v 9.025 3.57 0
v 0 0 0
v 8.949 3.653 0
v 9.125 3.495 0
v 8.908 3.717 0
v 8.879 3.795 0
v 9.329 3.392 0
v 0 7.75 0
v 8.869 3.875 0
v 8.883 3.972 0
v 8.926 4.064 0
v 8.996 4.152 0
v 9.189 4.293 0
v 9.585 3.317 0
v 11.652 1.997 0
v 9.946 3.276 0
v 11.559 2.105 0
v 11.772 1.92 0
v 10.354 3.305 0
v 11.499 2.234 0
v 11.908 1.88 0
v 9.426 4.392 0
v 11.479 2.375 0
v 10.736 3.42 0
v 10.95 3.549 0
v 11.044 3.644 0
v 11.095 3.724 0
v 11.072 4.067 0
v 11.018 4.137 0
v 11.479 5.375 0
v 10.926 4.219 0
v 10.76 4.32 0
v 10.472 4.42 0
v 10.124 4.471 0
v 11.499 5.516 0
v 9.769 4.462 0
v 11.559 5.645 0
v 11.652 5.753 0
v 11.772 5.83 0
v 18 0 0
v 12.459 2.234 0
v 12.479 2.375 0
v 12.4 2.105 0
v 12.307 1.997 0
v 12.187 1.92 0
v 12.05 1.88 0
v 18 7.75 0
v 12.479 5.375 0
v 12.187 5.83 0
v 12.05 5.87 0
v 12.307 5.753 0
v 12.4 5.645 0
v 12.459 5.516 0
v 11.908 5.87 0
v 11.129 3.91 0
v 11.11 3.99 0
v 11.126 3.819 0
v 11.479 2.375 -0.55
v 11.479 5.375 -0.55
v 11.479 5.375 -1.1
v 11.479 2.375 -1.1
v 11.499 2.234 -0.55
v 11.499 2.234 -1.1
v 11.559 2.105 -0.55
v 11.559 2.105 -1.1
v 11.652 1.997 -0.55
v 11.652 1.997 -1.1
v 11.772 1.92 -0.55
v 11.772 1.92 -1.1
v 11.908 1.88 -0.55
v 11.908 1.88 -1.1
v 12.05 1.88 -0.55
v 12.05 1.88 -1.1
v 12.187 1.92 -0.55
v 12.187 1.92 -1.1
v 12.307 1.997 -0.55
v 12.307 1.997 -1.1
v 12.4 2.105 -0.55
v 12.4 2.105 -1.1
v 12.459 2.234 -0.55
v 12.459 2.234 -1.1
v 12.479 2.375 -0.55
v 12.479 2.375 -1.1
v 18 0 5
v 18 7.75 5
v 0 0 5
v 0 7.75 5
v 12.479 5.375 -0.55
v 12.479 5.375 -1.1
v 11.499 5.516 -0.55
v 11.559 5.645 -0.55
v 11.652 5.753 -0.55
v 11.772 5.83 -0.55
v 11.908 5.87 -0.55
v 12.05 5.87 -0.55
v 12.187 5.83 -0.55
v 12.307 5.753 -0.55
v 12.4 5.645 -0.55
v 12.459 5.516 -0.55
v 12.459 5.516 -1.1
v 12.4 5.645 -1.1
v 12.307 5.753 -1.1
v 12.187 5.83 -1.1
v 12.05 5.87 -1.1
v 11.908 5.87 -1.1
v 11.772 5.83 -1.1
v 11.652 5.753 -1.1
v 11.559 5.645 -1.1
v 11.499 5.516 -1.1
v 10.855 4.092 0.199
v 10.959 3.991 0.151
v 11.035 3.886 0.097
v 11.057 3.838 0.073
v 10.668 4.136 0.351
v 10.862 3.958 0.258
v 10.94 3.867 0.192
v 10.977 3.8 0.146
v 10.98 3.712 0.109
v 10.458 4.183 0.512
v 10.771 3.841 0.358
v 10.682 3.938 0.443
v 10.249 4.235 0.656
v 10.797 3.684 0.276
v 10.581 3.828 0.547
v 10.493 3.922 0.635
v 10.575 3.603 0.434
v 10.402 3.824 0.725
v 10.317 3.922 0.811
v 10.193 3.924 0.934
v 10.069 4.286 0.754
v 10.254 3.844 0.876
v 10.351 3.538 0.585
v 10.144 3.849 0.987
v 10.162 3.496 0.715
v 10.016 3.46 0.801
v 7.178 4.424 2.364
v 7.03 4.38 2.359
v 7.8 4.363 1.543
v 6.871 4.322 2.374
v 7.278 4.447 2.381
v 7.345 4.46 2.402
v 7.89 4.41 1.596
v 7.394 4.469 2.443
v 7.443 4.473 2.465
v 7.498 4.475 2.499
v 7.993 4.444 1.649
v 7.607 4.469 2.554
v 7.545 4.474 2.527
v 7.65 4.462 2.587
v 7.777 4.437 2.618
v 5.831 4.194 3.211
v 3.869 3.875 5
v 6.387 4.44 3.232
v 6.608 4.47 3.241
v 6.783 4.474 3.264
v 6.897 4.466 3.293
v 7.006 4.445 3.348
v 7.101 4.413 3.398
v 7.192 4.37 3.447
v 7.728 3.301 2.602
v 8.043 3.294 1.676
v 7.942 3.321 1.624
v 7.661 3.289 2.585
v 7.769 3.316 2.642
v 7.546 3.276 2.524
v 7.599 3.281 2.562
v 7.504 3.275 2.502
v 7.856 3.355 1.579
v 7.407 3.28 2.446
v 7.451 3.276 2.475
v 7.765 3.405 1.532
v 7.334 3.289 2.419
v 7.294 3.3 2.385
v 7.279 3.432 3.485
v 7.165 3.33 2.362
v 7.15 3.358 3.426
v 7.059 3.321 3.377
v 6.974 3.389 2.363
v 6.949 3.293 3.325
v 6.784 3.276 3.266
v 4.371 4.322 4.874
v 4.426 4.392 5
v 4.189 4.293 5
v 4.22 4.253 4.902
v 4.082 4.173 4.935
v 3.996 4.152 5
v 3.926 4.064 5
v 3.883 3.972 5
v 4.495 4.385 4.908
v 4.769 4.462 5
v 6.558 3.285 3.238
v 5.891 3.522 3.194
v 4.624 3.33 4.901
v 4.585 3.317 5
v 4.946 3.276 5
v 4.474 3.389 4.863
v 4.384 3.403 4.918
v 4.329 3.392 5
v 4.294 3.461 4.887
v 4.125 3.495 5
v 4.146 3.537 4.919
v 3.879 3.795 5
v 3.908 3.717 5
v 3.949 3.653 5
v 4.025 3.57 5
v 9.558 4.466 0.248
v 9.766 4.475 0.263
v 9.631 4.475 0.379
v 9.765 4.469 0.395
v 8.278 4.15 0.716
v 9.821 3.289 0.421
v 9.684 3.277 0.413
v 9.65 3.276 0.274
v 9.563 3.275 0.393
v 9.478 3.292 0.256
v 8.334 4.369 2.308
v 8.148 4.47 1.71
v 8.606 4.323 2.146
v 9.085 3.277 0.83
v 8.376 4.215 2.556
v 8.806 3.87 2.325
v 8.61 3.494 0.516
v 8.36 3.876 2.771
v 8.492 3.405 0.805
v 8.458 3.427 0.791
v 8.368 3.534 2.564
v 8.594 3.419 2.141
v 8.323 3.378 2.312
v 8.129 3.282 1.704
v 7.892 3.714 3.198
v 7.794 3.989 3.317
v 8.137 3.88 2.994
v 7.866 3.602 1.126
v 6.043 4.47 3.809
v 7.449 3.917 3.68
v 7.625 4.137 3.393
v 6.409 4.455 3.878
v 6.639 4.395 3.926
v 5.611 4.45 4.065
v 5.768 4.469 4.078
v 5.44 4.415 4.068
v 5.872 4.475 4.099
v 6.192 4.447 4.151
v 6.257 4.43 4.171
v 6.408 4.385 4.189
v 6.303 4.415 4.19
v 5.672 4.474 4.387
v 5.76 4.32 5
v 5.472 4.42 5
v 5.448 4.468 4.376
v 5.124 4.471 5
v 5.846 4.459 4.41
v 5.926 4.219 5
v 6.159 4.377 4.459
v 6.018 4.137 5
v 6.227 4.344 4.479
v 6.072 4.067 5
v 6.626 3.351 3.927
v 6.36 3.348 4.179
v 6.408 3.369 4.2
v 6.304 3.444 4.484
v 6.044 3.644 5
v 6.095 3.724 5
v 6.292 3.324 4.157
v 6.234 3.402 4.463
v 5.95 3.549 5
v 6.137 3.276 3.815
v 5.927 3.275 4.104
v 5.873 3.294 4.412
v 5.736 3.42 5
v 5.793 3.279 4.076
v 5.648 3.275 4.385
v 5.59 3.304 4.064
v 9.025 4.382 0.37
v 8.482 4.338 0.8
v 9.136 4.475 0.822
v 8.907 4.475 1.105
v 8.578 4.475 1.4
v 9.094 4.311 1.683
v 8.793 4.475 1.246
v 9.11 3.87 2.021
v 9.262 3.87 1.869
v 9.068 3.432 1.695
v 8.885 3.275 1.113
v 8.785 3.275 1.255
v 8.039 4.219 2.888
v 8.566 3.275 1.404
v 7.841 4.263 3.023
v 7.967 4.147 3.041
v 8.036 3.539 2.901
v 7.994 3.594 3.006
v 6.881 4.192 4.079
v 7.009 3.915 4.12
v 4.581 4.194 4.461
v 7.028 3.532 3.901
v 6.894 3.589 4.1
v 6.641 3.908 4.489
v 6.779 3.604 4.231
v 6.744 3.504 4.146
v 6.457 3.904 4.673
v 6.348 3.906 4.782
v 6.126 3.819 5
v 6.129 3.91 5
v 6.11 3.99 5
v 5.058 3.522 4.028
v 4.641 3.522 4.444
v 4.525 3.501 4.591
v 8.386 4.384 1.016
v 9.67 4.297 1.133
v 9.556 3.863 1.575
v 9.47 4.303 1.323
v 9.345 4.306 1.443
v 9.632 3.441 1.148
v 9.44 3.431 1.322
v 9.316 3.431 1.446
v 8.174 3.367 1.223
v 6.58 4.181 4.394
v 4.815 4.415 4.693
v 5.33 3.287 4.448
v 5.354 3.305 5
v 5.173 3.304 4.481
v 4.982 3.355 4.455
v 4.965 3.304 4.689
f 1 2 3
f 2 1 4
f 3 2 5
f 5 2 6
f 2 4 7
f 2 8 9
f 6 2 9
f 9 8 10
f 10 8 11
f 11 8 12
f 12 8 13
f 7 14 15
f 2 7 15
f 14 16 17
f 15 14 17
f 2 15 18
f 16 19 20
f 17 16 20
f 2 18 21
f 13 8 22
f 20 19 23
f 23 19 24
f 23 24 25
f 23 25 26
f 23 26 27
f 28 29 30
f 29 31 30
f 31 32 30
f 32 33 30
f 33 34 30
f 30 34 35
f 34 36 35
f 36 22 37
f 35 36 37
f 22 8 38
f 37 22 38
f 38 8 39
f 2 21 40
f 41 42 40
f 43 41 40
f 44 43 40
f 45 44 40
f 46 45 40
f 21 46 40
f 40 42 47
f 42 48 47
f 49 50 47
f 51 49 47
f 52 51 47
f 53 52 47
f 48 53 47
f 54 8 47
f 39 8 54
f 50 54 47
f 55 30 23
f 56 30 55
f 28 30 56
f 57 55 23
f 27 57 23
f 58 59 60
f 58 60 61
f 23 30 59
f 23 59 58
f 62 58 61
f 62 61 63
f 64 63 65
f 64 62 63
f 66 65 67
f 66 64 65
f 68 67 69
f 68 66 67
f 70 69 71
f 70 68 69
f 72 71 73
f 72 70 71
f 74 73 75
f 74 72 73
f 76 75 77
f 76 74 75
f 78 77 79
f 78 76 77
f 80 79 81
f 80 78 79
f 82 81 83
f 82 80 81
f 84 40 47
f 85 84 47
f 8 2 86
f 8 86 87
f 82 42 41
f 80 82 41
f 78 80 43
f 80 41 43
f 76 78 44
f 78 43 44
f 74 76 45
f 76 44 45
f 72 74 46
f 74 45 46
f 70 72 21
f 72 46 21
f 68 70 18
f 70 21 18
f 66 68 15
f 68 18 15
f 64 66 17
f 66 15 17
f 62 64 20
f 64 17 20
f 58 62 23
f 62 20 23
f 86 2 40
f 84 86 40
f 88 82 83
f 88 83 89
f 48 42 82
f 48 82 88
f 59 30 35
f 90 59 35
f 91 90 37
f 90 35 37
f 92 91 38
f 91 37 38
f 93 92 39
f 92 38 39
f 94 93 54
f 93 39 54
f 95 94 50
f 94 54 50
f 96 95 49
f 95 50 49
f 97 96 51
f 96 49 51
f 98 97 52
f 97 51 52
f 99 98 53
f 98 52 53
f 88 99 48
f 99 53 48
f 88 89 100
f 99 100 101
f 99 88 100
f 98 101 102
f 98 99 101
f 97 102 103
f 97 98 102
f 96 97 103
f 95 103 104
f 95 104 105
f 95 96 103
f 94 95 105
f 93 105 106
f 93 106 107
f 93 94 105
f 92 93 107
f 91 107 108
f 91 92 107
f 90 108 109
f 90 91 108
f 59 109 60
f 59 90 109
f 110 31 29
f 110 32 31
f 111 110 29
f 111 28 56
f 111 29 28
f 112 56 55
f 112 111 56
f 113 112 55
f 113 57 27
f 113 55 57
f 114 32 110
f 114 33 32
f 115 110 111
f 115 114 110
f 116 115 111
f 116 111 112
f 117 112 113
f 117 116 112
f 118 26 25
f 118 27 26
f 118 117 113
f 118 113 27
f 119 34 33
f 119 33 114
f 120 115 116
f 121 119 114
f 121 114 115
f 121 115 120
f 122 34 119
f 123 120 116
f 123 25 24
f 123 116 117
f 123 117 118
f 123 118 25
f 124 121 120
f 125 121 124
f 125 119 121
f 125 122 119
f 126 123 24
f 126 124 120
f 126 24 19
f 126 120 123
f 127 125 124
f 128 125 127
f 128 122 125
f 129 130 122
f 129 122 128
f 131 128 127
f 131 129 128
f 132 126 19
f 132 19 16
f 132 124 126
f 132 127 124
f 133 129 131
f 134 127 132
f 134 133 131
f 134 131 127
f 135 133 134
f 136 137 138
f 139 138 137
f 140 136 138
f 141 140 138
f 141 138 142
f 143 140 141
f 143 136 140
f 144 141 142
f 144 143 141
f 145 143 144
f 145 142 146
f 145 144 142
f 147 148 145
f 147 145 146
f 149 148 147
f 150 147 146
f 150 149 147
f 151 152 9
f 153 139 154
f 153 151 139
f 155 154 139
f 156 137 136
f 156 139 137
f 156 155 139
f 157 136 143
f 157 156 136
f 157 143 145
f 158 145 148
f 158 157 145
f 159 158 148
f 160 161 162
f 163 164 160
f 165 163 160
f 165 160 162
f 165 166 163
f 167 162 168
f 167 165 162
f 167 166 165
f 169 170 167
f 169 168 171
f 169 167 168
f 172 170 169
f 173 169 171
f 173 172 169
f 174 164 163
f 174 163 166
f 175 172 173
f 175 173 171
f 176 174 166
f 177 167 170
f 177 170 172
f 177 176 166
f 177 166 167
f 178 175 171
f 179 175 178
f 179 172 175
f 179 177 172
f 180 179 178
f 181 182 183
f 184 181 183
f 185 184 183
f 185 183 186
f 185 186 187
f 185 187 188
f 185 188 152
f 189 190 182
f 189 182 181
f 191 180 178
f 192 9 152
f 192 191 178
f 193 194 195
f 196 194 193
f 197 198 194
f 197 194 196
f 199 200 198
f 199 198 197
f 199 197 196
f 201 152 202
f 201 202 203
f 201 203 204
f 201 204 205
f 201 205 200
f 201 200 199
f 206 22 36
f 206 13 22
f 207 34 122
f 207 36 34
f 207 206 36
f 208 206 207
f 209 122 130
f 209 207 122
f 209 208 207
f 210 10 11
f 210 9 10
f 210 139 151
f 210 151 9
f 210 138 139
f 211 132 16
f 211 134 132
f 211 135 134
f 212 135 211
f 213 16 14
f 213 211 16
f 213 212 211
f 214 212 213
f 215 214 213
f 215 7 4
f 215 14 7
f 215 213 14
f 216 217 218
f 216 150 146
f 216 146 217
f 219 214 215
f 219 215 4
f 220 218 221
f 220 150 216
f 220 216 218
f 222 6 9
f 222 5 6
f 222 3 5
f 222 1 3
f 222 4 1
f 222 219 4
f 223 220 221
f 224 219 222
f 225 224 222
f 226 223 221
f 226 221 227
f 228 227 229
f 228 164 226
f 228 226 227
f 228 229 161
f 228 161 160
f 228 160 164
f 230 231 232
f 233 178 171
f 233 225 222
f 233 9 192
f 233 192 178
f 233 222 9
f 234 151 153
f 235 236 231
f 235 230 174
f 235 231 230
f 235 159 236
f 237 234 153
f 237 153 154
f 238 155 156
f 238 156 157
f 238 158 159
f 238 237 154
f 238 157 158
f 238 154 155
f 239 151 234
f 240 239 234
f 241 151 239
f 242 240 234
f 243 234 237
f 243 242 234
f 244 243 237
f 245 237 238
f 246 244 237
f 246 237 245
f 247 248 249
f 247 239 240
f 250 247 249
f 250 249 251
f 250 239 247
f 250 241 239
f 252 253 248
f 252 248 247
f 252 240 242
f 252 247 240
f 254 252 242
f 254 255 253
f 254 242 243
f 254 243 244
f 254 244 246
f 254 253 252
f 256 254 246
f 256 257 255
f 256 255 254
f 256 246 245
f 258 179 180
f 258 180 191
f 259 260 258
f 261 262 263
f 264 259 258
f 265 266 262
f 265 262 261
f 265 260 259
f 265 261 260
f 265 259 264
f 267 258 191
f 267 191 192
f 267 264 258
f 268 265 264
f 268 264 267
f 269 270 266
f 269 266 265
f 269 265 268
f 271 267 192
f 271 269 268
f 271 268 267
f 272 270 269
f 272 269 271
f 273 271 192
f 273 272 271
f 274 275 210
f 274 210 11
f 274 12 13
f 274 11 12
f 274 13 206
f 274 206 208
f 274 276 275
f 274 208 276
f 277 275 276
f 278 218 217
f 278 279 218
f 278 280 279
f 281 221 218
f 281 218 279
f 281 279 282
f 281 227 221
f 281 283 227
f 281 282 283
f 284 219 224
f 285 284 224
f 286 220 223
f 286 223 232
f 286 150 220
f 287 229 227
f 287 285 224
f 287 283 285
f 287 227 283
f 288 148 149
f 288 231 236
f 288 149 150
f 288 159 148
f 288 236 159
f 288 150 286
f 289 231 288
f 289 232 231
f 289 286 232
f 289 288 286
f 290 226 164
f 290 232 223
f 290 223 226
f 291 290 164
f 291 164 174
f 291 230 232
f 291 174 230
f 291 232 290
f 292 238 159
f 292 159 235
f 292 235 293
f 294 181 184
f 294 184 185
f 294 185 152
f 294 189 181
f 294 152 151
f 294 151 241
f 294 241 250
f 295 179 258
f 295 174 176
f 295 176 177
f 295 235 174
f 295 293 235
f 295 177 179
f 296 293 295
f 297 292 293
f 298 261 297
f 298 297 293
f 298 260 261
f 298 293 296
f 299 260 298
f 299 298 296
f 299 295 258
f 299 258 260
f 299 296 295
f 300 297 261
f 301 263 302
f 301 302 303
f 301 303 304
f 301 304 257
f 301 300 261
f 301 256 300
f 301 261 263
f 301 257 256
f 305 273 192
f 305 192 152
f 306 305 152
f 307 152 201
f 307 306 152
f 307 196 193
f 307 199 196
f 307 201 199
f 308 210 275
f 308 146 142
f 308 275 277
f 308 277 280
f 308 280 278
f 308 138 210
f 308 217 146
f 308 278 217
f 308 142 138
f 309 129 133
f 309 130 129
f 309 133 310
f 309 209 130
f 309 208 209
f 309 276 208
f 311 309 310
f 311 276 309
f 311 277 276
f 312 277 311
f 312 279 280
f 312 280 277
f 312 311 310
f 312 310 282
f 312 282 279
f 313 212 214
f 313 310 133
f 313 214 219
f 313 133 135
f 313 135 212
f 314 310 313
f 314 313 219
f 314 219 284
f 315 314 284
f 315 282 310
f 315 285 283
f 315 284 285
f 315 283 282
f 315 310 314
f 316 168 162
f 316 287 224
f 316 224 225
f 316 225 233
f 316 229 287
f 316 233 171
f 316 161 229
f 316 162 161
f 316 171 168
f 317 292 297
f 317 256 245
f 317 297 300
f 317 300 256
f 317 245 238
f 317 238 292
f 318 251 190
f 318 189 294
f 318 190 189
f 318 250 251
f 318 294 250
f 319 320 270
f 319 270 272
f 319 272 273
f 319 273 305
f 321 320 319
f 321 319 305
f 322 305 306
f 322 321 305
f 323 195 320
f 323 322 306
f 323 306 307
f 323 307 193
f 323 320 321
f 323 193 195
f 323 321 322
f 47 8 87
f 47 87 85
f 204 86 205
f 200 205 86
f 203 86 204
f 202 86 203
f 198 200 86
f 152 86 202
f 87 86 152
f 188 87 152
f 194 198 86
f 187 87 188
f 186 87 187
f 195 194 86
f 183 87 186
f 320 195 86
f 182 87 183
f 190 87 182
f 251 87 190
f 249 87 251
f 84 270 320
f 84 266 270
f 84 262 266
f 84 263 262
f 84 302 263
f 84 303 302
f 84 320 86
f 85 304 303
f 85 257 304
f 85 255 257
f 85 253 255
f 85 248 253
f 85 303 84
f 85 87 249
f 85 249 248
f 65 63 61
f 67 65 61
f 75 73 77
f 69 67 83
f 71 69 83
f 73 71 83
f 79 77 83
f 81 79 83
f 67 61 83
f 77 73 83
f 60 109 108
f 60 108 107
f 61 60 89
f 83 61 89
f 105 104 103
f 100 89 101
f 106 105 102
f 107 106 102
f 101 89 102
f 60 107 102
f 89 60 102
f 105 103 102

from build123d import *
from build123d.topology import SkipClean

# Parameters (mm, degrees)
ESQUISSE1_W                  = 18
ESQUISSE1_H                  = 7.75
BOSS_EXTRU_1_DEPTH           = 5
ENL_V_MAT_EXTRU_1_DEPTH      = 15
ENL_V_MAT_EXTRU_1_DEPTH_BACK = 10
ESQUISSE13_RX                = 0.8
ESQUISSE13_RY                = 0.6
ESQUISSE15_R                 = 0.5
BOSS_EXTRU_3_DEPTH           = 0.55
BOSS_EXTRU_4_DEPTH           = 1.1


with BuildPart() as part:
    # Esquisse1 → Boss.-Extru.1 (new body)
    with BuildSketch(Plane.XY):
        with Locations((9, 3.875)):
            Rectangle(ESQUISSE1_W, ESQUISSE1_H)
    extrude(amount=BOSS_EXTRU_1_DEPTH)

    # Esquisse13 → Enlèv. mat.-Extru.1 (cut, two sides: drawn at the far end of the back side and taken through both)
    with BuildSketch(Plane(origin=(5, 3.875, 5), x_dir=(-0.7071067811865476, 0, -0.7071067811865475), z_dir=(0.7071067811865475, 0, -0.7071067811865476)).offset(-ENL_V_MAT_EXTRU_1_DEPTH_BACK)):
        with Locations(Location((0, 0), (0, 0, 0))):
            Ellipse(ESQUISSE13_RX, ESQUISSE13_RY)
    extrude(amount=ENL_V_MAT_EXTRU_1_DEPTH + ENL_V_MAT_EXTRU_1_DEPTH_BACK, mode=Mode.SUBTRACT)

    # Esquisse15 → Boss.-Extru.3 (add)
    with BuildSketch(Plane(origin=(0, 0, 0), x_dir=(-1, 0, 0), z_dir=(0, 0, -1))):
        with Locations((-11.979236125, 2.375)):
            Circle(ESQUISSE15_R)
        with Locations((-11.979236125, 5.375)):
            Circle(ESQUISSE15_R)
    extrude(amount=BOSS_EXTRU_3_DEPTH)

    # Esquisse16 → Boss.-Extru.4 (add)
    with SkipClean():  # the faces are left unmerged after this step: merging them gives an invalid solid
        with BuildSketch(Plane(origin=(0, 0, 0), x_dir=(-1, 0, 0), z_dir=(0, 0, -1))):
            with BuildLine():
                Line((-12.479236125, 2.375), (-12.479236125, 5.375))
                ThreePointArc((-12.479236125, 5.375), (-11.979236125, 5.875), (-11.479236125, 5.375))
                Line((-11.479236125, 5.375), (-11.479236125, 2.375))
                ThreePointArc((-11.479236125, 2.375), (-11.979236125, 1.875), (-12.479236125, 2.375))
            make_face()
        extrude(amount=BOSS_EXTRU_4_DEPTH)


solid = part.part
